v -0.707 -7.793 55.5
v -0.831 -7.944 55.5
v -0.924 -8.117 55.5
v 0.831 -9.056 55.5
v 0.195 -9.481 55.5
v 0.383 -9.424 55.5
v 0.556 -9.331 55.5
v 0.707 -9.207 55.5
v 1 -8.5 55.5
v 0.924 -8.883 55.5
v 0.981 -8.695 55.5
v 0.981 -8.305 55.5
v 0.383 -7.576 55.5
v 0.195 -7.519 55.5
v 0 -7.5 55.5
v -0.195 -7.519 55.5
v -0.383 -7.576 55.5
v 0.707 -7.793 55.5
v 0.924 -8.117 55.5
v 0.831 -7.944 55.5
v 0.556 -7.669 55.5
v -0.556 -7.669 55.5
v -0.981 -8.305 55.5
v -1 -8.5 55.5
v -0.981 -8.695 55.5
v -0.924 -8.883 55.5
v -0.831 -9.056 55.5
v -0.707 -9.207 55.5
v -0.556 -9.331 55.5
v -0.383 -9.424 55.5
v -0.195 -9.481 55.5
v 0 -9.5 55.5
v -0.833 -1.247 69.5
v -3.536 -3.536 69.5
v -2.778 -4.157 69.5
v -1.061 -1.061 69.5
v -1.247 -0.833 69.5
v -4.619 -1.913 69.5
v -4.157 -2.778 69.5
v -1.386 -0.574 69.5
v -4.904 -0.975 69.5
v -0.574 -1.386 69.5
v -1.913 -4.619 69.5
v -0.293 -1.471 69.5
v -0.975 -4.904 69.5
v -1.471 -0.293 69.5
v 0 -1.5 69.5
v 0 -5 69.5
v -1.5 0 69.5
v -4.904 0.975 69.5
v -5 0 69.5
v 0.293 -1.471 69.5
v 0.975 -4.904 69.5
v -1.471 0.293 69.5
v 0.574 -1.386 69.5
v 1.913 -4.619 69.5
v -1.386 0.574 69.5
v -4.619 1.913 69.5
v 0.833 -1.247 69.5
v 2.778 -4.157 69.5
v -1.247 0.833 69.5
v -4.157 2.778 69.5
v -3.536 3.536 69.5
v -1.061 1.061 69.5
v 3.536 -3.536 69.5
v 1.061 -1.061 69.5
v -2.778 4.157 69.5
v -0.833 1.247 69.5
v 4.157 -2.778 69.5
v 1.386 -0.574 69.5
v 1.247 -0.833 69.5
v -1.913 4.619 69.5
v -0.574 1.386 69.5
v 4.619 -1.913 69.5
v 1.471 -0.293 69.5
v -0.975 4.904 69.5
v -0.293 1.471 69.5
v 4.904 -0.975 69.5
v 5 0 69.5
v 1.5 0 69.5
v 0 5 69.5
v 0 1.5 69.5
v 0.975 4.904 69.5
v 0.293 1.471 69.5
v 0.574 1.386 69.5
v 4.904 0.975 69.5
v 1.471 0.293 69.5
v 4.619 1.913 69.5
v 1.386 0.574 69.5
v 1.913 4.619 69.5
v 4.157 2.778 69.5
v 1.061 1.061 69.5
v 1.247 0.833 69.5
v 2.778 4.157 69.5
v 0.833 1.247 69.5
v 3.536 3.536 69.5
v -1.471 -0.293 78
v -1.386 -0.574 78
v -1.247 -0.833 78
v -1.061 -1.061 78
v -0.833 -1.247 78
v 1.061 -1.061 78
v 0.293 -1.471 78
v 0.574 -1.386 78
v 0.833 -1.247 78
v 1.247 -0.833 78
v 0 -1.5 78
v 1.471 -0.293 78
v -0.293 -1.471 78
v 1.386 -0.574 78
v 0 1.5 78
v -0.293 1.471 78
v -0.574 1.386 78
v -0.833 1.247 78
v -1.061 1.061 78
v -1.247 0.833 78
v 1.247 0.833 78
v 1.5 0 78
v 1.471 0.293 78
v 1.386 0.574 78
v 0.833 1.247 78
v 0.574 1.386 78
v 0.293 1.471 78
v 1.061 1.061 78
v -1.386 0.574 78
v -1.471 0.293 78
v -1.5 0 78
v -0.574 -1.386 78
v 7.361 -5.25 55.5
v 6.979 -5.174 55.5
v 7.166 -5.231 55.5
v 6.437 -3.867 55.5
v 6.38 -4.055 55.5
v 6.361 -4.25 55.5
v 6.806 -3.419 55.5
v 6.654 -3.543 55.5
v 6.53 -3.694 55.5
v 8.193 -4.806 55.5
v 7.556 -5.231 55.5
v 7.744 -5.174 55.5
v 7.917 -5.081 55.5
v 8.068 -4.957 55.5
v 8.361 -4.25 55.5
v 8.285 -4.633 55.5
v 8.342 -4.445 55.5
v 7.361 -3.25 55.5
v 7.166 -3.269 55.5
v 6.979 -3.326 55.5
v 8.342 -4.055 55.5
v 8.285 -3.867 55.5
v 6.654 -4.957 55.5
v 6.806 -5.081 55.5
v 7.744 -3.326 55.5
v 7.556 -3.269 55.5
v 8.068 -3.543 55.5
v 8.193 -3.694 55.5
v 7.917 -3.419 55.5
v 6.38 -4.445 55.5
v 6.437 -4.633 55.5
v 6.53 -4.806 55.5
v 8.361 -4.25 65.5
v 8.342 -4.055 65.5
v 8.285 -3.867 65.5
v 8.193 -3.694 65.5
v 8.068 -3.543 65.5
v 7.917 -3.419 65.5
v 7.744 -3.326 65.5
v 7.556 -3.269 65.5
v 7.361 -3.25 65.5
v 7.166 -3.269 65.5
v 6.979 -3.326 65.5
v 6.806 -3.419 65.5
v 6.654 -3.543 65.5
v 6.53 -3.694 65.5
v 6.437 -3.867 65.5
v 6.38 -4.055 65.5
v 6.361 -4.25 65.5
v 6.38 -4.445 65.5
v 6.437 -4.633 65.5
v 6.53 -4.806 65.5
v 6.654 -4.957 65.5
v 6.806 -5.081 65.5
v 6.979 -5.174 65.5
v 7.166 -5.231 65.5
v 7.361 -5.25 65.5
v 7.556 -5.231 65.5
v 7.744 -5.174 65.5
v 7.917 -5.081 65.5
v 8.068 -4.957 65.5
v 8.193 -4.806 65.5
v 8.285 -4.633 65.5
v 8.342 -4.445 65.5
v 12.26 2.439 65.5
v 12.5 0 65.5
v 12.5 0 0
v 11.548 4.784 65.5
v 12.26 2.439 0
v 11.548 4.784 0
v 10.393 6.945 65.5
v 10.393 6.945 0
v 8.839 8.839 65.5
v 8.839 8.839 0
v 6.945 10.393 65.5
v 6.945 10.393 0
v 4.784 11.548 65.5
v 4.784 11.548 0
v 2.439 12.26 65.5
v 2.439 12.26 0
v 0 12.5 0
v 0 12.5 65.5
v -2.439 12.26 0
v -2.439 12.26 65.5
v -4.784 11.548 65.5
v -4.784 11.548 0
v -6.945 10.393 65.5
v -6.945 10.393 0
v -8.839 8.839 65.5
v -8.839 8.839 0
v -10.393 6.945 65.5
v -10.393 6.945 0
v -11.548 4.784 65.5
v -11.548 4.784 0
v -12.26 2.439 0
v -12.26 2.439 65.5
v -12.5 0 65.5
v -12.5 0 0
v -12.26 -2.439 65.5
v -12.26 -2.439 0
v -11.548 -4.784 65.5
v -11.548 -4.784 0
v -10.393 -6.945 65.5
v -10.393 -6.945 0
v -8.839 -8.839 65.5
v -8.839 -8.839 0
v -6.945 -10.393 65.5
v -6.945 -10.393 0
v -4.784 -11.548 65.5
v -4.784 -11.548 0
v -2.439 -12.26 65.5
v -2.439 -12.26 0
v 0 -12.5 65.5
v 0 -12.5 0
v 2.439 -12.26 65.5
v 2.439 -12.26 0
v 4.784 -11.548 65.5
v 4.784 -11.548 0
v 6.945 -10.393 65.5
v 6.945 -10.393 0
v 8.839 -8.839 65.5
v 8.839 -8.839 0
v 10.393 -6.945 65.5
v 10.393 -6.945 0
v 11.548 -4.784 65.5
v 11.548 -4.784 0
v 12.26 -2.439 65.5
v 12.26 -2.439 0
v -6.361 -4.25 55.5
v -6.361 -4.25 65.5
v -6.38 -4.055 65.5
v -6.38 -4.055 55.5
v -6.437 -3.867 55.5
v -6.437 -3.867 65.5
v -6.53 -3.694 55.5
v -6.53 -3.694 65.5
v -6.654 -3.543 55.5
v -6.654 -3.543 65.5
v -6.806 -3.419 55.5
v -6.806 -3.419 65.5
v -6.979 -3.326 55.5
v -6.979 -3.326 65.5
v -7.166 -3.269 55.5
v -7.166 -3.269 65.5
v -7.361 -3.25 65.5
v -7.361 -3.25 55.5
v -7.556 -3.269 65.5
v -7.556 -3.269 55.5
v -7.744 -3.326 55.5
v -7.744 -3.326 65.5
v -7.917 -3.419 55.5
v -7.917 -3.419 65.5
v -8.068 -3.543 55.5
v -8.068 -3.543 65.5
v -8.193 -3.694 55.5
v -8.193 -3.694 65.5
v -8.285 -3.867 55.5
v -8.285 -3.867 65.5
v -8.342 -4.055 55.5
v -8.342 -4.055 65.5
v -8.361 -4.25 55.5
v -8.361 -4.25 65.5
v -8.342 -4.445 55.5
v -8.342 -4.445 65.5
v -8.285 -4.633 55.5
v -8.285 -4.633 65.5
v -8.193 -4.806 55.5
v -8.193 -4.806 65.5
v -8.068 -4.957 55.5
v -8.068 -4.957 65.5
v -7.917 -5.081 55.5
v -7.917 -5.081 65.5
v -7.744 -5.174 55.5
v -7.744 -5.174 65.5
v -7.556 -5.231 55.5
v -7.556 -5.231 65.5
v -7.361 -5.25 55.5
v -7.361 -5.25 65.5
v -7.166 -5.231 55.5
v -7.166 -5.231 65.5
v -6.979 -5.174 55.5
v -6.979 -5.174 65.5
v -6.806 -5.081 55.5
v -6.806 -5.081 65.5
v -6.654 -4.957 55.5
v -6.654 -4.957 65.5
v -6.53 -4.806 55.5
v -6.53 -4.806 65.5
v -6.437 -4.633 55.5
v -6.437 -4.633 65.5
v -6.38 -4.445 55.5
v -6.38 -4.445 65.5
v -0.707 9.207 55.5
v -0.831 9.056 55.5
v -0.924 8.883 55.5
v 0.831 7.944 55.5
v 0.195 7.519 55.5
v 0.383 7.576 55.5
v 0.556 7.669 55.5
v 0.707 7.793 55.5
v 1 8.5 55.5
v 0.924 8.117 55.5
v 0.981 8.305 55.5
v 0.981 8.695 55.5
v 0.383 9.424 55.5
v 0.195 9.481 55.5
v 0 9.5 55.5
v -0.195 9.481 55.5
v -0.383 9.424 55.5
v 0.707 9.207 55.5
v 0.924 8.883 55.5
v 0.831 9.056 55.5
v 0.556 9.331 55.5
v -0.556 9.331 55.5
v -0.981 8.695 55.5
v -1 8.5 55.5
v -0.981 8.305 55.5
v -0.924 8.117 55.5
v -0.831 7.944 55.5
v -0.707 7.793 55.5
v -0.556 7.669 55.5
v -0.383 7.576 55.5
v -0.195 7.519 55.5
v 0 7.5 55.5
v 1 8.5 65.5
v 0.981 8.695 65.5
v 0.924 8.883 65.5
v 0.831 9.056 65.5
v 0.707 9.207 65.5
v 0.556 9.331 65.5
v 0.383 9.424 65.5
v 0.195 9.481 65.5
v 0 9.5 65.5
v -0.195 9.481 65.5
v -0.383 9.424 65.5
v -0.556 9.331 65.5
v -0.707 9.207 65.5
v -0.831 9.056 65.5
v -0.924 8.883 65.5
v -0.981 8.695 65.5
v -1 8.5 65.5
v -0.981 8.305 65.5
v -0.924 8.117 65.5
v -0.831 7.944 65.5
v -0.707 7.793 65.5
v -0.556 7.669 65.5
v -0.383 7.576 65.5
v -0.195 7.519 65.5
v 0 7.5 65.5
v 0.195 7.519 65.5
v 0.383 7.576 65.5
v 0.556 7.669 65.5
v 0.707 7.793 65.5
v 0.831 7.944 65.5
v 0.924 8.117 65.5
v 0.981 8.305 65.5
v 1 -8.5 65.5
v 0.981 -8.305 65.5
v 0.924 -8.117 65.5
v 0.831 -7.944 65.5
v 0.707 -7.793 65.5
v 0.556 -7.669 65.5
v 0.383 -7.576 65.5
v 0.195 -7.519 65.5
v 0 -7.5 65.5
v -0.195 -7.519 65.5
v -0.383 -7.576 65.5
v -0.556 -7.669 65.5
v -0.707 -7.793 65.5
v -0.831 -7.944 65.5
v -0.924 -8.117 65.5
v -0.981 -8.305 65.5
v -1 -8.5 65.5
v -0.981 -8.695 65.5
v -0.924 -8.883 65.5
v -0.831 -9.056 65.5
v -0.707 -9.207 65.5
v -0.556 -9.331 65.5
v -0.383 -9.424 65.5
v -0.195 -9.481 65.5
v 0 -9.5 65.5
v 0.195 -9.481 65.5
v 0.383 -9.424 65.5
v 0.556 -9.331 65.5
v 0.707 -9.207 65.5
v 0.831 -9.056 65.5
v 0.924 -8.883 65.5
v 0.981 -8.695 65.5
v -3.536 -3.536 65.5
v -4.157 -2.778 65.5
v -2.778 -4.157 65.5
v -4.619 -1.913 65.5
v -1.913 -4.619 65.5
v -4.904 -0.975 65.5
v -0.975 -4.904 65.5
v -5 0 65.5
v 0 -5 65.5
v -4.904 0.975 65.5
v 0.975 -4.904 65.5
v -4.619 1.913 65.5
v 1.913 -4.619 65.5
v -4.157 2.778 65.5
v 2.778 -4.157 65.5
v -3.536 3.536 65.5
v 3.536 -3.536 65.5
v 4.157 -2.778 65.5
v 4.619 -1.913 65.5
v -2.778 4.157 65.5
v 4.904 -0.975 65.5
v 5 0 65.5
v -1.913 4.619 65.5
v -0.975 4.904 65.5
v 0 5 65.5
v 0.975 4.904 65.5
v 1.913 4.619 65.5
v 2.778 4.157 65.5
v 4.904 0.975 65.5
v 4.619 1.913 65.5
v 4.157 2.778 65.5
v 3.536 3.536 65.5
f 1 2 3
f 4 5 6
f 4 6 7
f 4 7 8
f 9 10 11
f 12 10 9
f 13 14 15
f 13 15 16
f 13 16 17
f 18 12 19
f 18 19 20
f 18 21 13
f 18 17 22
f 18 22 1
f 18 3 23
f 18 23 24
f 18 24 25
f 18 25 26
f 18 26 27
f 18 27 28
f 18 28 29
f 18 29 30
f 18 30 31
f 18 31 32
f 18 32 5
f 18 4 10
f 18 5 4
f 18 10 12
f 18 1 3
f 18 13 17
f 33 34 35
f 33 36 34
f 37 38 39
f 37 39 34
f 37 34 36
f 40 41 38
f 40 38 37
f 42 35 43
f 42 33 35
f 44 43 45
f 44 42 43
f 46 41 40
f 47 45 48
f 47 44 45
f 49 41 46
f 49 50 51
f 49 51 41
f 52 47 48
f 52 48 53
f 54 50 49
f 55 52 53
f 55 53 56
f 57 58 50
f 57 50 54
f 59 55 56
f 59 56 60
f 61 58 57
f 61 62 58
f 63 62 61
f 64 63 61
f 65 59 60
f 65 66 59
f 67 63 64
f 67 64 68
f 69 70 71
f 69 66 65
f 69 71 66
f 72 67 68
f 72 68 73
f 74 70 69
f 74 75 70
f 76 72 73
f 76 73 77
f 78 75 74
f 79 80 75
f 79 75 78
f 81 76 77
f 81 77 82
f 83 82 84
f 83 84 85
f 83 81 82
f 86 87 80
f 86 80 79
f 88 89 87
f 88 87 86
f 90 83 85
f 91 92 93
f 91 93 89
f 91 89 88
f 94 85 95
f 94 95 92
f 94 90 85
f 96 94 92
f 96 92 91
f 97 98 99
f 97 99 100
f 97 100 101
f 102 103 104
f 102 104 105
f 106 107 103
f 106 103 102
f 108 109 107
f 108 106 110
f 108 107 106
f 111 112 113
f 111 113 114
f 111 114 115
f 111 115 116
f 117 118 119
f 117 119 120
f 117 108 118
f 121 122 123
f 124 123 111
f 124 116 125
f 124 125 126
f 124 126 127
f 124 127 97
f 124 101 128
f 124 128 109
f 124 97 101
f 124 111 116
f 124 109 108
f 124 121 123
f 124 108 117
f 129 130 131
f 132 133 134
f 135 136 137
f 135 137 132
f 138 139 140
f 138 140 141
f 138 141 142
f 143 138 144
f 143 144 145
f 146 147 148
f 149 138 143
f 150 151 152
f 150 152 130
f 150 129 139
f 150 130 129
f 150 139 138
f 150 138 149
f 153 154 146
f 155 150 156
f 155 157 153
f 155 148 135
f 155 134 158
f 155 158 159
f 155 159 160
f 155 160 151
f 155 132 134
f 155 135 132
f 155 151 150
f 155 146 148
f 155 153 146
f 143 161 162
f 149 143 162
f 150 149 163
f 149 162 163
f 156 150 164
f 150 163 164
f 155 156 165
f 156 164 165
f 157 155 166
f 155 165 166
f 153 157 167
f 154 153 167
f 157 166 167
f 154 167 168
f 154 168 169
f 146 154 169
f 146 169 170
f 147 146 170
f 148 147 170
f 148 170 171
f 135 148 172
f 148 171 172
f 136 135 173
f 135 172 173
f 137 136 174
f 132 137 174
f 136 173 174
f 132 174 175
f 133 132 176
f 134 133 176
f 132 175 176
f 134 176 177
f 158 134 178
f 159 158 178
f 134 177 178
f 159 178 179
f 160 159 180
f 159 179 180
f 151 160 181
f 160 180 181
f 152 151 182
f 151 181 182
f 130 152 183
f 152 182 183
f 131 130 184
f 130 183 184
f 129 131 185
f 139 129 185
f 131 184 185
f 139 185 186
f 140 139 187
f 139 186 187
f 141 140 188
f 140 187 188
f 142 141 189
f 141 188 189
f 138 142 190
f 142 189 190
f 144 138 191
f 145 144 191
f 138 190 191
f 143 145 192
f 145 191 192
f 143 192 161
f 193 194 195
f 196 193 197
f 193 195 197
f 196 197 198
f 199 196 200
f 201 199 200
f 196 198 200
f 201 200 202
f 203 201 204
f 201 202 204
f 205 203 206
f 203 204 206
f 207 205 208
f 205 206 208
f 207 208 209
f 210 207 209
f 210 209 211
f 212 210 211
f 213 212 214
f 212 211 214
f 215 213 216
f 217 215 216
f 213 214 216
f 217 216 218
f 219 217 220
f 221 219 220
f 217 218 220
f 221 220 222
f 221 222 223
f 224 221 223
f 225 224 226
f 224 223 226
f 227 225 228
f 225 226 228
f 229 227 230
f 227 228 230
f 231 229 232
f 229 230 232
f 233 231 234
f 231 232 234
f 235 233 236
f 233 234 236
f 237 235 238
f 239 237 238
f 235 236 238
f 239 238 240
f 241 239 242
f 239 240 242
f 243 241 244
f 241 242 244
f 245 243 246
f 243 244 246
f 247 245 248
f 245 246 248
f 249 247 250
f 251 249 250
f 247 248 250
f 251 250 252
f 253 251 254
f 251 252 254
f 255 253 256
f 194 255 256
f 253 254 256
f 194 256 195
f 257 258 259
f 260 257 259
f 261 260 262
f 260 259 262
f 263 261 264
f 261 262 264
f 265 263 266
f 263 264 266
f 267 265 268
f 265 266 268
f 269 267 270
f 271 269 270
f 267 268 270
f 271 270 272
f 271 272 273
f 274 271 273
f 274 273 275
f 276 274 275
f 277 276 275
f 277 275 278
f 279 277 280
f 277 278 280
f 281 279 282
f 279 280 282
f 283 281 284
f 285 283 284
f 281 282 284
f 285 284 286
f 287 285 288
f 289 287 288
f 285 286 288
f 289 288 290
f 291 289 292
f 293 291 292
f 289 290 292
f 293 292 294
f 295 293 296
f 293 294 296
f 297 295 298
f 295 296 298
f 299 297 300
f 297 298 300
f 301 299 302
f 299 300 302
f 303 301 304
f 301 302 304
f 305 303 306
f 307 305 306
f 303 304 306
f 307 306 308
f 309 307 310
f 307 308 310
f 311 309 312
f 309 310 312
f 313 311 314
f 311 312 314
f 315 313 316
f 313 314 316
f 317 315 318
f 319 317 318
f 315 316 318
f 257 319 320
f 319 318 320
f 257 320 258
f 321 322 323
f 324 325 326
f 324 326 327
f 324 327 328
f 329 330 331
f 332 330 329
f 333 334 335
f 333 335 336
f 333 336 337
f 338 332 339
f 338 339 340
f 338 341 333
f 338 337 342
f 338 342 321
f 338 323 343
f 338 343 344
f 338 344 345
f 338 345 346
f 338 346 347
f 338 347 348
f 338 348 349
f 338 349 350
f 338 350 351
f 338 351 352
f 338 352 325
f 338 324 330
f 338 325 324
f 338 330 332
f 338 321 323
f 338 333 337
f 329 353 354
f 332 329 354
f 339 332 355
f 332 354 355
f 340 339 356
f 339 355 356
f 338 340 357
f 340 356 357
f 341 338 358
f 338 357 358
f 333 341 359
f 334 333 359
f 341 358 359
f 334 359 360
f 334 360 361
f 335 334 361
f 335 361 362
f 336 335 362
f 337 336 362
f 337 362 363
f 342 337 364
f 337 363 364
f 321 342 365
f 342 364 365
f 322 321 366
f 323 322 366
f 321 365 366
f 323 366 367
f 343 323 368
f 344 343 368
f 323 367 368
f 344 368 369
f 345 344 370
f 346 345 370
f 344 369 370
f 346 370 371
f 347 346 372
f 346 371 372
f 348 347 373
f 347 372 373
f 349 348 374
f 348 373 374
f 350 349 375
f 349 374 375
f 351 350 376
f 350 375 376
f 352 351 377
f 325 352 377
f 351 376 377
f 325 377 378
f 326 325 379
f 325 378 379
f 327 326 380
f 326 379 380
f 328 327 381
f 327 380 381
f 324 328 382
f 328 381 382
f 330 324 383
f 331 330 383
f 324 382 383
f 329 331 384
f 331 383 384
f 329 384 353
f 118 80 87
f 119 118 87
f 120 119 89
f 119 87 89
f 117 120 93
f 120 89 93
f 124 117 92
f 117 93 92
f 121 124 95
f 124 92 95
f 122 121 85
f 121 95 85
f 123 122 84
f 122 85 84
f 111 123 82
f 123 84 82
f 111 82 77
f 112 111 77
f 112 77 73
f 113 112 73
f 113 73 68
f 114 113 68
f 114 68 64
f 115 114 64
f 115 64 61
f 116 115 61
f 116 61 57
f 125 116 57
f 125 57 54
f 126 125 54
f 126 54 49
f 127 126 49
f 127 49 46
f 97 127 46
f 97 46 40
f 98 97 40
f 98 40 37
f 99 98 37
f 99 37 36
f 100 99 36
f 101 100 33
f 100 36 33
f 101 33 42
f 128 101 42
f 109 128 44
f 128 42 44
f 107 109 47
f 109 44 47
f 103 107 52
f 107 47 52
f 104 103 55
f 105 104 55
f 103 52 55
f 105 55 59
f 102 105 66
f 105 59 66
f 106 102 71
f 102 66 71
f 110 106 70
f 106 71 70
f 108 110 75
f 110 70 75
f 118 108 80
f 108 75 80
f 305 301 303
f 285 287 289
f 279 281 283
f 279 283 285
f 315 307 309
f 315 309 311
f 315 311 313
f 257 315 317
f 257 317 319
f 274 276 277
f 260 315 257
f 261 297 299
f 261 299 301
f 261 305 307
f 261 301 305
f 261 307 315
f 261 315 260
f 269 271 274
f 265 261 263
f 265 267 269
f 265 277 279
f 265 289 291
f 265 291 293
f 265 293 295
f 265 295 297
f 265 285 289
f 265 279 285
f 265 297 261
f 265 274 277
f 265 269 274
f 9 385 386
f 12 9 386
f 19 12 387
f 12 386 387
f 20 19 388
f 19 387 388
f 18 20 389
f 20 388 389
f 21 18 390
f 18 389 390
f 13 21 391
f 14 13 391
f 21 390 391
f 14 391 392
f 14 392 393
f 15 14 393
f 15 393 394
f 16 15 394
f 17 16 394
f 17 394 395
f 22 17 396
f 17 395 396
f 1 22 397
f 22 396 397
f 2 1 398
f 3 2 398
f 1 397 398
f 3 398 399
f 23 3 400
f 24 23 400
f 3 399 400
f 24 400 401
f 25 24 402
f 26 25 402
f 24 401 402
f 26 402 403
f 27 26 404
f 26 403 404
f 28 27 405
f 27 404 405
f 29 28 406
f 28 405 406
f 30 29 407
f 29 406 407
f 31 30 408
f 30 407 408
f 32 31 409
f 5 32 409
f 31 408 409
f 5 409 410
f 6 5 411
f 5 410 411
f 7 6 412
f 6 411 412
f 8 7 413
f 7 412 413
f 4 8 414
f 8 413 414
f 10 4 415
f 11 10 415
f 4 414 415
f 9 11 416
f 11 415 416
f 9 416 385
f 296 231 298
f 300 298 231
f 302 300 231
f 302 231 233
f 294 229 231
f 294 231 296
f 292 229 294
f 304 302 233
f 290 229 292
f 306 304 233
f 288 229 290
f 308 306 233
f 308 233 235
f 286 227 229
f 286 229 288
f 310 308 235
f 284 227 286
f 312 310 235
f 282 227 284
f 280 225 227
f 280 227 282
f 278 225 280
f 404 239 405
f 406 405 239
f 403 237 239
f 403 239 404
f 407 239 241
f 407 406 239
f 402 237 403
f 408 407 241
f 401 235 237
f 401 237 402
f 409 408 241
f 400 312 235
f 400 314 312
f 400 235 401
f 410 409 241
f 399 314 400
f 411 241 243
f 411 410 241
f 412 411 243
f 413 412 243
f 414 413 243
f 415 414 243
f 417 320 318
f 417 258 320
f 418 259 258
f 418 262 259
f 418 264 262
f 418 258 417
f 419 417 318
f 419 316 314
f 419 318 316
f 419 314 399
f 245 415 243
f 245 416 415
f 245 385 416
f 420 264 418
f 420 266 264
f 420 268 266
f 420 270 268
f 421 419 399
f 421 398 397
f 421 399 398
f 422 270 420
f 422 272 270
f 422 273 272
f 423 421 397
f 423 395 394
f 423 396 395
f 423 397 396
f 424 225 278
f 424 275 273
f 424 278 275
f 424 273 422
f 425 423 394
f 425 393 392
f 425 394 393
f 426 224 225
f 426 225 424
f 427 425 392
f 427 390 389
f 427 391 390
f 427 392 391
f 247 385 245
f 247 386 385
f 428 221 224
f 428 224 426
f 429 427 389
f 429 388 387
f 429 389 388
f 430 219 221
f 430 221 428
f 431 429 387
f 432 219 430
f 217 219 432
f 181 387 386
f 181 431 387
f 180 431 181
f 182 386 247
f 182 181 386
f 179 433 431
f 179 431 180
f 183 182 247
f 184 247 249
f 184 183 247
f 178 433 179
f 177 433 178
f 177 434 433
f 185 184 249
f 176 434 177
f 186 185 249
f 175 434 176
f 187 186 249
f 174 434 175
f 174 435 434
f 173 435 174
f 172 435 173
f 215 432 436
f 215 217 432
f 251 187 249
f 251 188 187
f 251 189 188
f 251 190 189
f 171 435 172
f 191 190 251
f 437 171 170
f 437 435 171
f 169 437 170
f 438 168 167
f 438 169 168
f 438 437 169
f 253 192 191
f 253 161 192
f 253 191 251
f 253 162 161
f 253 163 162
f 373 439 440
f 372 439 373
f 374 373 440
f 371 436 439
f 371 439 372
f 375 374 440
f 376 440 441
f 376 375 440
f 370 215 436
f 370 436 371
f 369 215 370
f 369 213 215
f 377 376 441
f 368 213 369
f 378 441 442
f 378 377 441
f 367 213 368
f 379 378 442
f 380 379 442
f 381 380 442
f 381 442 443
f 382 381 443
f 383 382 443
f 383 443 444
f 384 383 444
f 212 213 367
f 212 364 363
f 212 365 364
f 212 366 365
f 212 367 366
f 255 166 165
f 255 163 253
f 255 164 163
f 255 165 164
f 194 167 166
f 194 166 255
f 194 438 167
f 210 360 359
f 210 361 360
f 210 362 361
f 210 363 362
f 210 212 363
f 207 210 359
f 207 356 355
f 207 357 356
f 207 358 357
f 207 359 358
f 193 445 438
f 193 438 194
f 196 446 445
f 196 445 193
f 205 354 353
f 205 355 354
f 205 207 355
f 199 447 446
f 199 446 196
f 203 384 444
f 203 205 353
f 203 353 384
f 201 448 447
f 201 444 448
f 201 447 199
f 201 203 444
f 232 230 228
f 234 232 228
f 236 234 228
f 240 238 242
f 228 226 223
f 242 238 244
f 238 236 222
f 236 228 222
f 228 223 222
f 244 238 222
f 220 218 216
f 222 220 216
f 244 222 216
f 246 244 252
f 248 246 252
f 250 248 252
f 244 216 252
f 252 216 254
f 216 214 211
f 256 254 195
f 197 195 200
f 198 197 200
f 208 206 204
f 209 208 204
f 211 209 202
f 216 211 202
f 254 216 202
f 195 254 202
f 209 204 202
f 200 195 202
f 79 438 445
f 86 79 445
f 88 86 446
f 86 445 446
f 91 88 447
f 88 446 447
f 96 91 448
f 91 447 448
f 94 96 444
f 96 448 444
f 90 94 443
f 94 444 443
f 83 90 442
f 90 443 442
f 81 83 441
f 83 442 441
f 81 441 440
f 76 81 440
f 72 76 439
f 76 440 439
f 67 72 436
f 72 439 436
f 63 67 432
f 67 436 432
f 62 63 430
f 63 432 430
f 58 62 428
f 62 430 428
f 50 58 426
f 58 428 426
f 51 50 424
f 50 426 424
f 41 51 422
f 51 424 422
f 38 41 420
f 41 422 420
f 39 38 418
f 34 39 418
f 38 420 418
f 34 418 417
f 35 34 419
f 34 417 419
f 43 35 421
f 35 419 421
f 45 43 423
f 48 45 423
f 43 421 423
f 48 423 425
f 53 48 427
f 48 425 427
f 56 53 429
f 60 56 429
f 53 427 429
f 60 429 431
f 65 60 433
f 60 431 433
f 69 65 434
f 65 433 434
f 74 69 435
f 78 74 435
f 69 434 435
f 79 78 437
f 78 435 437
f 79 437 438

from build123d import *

# Parameters (mm, degrees)
SKETCH_1_R          = 12.5
EXTRUDE_1_DEPTH     = 65.5
SKETCH_2_R          = 5
EXTRUDE_2_DEPTH     = 4
SKETCH_3_R          = 1.5
EXTRUDE_3_DEPTH     = 12.5
SKETCH_4_R          = 1
CUT_EXTRUDE_1_DEPTH = 10


with BuildPart() as part:
    # 스케치1 → 돌출1 (new body)
    with BuildSketch(Plane.XY):
        Circle(SKETCH_1_R)
    extrude(amount=EXTRUDE_1_DEPTH)

    # 스케치2 → 돌출2 (add)
    with BuildSketch(Plane.XY.offset(65.5)):
        Circle(SKETCH_2_R)
    extrude(amount=EXTRUDE_2_DEPTH)

    # 스케치3 → 돌출3 (add)
    with BuildSketch(Plane.XY.offset(65.5)):
        Circle(SKETCH_3_R)
    extrude(amount=EXTRUDE_3_DEPTH)

    # 스케치4 → 컷-돌출1 (cut)
    with BuildSketch(Plane.XY.offset(65.5)):
        with Locations((0, 8.5)):
            Circle(SKETCH_4_R)
        with Locations((0, -8.5)):
            Circle(SKETCH_4_R)
        with Locations((-7.361215932, -4.25)):
            Circle(SKETCH_4_R)
        with Locations((7.361215932, -4.25)):
            Circle(SKETCH_4_R)
    extrude(amount=-CUT_EXTRUDE_1_DEPTH, mode=Mode.SUBTRACT)


solid = part.part
